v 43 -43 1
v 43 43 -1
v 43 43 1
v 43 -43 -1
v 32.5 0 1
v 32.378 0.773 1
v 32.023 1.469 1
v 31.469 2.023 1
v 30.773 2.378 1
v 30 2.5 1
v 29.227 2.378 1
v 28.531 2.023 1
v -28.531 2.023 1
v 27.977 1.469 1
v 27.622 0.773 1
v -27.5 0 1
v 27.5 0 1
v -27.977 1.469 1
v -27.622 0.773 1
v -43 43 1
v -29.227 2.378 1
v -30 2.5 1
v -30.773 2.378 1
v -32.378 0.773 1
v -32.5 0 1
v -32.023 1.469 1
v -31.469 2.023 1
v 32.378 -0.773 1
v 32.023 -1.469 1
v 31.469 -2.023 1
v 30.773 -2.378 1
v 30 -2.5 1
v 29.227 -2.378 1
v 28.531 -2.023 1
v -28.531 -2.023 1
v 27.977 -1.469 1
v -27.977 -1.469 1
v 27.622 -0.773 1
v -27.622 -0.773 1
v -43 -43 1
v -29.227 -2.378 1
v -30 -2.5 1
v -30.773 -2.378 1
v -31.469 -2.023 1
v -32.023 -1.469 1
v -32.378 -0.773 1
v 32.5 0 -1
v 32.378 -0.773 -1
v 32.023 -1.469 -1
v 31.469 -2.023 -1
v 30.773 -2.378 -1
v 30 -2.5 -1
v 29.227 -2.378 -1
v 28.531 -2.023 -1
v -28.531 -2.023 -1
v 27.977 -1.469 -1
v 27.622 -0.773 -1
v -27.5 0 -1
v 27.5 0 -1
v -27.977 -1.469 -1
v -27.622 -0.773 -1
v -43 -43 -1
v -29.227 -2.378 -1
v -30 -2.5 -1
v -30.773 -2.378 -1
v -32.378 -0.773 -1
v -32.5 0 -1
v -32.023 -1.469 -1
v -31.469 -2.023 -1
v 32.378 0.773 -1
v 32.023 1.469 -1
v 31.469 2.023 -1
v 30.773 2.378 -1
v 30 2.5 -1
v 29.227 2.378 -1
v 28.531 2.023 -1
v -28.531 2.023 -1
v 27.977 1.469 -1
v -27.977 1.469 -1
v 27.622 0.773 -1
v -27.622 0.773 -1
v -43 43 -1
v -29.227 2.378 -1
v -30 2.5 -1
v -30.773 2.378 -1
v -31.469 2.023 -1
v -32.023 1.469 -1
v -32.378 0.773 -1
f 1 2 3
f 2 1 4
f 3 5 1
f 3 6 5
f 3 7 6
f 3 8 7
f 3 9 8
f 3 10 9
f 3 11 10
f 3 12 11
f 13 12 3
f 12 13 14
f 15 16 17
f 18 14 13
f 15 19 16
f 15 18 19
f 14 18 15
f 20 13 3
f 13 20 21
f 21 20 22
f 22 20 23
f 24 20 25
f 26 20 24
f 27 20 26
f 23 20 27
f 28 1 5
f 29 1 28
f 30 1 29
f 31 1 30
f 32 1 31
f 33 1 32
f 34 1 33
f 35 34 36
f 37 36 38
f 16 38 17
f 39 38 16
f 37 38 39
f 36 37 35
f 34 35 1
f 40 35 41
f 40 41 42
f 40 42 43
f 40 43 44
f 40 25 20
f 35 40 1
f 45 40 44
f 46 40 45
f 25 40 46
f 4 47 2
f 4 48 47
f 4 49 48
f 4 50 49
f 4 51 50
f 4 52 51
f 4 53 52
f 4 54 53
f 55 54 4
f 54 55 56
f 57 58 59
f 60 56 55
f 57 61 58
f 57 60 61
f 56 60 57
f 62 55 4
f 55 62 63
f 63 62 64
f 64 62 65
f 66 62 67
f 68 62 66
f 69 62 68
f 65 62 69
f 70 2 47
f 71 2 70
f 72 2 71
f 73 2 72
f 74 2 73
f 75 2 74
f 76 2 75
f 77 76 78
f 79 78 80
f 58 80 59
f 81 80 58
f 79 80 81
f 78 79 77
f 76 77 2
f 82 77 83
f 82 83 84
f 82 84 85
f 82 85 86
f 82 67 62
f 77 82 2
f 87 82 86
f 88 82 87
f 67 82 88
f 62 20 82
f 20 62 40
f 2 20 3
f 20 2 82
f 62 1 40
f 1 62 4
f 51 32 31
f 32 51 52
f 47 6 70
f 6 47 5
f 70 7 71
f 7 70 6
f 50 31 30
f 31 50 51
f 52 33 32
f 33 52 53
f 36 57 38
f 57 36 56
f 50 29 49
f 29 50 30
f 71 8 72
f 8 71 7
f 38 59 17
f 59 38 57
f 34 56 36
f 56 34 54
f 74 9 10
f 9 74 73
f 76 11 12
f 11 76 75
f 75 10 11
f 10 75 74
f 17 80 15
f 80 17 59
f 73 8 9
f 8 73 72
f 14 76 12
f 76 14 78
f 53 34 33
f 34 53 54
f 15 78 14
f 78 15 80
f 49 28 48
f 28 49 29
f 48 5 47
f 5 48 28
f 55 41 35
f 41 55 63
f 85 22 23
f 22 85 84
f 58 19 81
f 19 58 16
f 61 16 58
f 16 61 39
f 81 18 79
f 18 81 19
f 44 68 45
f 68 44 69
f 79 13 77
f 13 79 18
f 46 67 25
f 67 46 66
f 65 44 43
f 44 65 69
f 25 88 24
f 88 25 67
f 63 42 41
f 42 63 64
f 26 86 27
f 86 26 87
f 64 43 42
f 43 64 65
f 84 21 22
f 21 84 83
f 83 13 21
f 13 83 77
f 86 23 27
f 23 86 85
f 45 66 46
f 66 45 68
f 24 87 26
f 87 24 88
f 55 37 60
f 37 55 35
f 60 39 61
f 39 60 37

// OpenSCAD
x = 86;
y = 86;
z = 2;

$fn=20;

hole_d = 5;
hole_distance = 60;

module hole() {
 cylinder(d=hole_d, h=z, center=true);   
}


difference() {
cube([x, y, z], true);
translate([0.5*hole_distance, 0, 0]) hole();
translate([-0.5*hole_distance, 0, 0]) hole();
}
